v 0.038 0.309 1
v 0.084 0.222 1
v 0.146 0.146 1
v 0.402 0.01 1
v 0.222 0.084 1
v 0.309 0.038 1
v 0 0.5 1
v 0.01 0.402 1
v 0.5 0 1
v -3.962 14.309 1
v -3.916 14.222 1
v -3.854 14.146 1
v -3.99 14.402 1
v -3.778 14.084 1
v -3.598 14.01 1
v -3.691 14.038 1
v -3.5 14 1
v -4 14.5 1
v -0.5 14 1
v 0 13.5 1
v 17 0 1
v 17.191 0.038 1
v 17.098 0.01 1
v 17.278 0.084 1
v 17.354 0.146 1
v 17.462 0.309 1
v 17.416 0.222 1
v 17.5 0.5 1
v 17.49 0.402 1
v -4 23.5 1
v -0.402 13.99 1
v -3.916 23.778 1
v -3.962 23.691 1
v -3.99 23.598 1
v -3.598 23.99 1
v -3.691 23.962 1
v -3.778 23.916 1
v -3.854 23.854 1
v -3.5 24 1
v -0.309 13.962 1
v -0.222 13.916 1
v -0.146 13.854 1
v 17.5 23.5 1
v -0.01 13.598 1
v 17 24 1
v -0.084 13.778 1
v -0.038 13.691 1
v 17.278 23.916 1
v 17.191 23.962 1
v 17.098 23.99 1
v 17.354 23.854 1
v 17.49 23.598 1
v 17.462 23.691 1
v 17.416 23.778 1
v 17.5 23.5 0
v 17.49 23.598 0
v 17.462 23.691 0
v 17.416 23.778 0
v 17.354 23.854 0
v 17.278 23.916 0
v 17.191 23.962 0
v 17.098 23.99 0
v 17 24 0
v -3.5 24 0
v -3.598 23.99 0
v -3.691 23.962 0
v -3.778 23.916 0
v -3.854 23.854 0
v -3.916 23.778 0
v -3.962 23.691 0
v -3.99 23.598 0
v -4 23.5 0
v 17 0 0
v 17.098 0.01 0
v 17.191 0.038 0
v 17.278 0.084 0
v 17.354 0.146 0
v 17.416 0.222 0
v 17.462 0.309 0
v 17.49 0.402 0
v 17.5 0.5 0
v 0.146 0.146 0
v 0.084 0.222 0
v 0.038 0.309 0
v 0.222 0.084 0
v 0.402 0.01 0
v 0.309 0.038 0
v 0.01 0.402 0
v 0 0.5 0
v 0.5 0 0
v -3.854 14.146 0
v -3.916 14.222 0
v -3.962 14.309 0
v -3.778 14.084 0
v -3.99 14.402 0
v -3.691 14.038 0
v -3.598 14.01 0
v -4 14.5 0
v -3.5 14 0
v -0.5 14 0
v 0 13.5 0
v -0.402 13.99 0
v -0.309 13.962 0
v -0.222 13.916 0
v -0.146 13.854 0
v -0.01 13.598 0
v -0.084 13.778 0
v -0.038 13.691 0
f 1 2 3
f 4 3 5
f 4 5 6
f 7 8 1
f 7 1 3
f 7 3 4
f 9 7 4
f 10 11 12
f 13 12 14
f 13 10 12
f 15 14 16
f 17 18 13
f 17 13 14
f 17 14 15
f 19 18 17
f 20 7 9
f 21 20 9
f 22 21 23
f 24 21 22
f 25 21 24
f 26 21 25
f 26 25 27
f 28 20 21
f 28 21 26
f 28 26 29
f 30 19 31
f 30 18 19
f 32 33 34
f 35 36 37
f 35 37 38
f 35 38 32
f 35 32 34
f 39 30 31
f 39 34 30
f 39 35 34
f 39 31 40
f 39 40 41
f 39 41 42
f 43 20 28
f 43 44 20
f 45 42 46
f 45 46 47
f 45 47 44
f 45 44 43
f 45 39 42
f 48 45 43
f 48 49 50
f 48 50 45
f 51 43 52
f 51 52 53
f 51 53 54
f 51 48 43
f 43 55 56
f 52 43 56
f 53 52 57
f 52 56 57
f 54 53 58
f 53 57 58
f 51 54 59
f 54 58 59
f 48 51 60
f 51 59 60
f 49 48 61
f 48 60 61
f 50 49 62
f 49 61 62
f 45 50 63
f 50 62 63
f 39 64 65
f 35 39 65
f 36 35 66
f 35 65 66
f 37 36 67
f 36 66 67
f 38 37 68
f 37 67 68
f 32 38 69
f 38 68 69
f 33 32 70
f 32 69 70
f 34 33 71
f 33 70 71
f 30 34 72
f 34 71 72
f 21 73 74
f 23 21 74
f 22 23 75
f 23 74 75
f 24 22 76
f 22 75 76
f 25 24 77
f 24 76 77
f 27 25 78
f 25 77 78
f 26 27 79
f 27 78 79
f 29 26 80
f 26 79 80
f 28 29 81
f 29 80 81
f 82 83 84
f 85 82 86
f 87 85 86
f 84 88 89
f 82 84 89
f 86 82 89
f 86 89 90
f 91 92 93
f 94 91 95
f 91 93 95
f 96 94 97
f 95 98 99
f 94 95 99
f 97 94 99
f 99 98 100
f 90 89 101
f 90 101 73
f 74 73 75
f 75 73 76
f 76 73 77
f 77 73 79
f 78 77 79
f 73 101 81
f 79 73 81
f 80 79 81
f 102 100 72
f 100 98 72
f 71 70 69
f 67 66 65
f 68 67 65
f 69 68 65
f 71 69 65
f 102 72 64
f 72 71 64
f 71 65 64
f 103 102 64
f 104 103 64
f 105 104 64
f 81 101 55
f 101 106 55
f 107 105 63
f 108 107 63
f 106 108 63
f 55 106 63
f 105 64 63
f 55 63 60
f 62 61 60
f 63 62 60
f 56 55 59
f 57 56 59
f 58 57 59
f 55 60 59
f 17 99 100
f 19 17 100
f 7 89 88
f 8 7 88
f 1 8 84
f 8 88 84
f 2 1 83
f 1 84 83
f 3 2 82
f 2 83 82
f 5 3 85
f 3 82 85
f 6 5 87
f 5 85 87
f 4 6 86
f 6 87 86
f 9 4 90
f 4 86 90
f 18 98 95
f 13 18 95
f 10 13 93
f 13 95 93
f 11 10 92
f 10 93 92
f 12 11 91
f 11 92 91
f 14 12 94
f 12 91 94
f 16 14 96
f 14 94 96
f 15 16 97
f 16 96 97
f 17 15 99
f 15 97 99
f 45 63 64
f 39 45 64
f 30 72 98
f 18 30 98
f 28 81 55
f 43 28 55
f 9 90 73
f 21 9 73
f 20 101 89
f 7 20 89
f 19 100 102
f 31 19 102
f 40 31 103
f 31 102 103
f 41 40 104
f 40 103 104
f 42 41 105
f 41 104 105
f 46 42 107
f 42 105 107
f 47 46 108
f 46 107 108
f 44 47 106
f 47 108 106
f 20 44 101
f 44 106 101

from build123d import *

# Parameters (mm, degrees)
EXTRUDE_1_DEPTH = 1


with BuildPart() as part:
    # 草图1 → 凸台-拉伸1 (new body)
    with BuildSketch(Plane.XY):
        with BuildLine():
            Line((1.5, 24), (-3.5, 24))
            ThreePointArc((-3.5, 24), (-3.853553391, 23.853553391), (-4, 23.5))
            Line((-4, 23.5), (-4, 14.5))
            ThreePointArc((-4, 14.5), (-3.853553391, 14.146446609), (-3.5, 14))
            Line((-3.5, 14), (-0.5, 14))
            ThreePointArc((-0.5, 14), (-0.146446609, 13.853553391), (0, 13.5))
            Line((0, 13.5), (0, 0.5))
            ThreePointArc((0, 0.5), (0.146446609, 0.146446609), (0.5, 0))
            Line((0.5, 0), (17, 0))
            ThreePointArc((17, 0), (17.353553391, 0.146446609), (17.5, 0.5))
            Line((17.5, 0.5), (17.5, 23.5))
            ThreePointArc((17.5, 23.5), (17.353553391, 23.853553391), (17, 24))
            Line((17, 24), (1.5, 24))
        make_face()
    extrude(amount=EXTRUDE_1_DEPTH)


solid = part.part
